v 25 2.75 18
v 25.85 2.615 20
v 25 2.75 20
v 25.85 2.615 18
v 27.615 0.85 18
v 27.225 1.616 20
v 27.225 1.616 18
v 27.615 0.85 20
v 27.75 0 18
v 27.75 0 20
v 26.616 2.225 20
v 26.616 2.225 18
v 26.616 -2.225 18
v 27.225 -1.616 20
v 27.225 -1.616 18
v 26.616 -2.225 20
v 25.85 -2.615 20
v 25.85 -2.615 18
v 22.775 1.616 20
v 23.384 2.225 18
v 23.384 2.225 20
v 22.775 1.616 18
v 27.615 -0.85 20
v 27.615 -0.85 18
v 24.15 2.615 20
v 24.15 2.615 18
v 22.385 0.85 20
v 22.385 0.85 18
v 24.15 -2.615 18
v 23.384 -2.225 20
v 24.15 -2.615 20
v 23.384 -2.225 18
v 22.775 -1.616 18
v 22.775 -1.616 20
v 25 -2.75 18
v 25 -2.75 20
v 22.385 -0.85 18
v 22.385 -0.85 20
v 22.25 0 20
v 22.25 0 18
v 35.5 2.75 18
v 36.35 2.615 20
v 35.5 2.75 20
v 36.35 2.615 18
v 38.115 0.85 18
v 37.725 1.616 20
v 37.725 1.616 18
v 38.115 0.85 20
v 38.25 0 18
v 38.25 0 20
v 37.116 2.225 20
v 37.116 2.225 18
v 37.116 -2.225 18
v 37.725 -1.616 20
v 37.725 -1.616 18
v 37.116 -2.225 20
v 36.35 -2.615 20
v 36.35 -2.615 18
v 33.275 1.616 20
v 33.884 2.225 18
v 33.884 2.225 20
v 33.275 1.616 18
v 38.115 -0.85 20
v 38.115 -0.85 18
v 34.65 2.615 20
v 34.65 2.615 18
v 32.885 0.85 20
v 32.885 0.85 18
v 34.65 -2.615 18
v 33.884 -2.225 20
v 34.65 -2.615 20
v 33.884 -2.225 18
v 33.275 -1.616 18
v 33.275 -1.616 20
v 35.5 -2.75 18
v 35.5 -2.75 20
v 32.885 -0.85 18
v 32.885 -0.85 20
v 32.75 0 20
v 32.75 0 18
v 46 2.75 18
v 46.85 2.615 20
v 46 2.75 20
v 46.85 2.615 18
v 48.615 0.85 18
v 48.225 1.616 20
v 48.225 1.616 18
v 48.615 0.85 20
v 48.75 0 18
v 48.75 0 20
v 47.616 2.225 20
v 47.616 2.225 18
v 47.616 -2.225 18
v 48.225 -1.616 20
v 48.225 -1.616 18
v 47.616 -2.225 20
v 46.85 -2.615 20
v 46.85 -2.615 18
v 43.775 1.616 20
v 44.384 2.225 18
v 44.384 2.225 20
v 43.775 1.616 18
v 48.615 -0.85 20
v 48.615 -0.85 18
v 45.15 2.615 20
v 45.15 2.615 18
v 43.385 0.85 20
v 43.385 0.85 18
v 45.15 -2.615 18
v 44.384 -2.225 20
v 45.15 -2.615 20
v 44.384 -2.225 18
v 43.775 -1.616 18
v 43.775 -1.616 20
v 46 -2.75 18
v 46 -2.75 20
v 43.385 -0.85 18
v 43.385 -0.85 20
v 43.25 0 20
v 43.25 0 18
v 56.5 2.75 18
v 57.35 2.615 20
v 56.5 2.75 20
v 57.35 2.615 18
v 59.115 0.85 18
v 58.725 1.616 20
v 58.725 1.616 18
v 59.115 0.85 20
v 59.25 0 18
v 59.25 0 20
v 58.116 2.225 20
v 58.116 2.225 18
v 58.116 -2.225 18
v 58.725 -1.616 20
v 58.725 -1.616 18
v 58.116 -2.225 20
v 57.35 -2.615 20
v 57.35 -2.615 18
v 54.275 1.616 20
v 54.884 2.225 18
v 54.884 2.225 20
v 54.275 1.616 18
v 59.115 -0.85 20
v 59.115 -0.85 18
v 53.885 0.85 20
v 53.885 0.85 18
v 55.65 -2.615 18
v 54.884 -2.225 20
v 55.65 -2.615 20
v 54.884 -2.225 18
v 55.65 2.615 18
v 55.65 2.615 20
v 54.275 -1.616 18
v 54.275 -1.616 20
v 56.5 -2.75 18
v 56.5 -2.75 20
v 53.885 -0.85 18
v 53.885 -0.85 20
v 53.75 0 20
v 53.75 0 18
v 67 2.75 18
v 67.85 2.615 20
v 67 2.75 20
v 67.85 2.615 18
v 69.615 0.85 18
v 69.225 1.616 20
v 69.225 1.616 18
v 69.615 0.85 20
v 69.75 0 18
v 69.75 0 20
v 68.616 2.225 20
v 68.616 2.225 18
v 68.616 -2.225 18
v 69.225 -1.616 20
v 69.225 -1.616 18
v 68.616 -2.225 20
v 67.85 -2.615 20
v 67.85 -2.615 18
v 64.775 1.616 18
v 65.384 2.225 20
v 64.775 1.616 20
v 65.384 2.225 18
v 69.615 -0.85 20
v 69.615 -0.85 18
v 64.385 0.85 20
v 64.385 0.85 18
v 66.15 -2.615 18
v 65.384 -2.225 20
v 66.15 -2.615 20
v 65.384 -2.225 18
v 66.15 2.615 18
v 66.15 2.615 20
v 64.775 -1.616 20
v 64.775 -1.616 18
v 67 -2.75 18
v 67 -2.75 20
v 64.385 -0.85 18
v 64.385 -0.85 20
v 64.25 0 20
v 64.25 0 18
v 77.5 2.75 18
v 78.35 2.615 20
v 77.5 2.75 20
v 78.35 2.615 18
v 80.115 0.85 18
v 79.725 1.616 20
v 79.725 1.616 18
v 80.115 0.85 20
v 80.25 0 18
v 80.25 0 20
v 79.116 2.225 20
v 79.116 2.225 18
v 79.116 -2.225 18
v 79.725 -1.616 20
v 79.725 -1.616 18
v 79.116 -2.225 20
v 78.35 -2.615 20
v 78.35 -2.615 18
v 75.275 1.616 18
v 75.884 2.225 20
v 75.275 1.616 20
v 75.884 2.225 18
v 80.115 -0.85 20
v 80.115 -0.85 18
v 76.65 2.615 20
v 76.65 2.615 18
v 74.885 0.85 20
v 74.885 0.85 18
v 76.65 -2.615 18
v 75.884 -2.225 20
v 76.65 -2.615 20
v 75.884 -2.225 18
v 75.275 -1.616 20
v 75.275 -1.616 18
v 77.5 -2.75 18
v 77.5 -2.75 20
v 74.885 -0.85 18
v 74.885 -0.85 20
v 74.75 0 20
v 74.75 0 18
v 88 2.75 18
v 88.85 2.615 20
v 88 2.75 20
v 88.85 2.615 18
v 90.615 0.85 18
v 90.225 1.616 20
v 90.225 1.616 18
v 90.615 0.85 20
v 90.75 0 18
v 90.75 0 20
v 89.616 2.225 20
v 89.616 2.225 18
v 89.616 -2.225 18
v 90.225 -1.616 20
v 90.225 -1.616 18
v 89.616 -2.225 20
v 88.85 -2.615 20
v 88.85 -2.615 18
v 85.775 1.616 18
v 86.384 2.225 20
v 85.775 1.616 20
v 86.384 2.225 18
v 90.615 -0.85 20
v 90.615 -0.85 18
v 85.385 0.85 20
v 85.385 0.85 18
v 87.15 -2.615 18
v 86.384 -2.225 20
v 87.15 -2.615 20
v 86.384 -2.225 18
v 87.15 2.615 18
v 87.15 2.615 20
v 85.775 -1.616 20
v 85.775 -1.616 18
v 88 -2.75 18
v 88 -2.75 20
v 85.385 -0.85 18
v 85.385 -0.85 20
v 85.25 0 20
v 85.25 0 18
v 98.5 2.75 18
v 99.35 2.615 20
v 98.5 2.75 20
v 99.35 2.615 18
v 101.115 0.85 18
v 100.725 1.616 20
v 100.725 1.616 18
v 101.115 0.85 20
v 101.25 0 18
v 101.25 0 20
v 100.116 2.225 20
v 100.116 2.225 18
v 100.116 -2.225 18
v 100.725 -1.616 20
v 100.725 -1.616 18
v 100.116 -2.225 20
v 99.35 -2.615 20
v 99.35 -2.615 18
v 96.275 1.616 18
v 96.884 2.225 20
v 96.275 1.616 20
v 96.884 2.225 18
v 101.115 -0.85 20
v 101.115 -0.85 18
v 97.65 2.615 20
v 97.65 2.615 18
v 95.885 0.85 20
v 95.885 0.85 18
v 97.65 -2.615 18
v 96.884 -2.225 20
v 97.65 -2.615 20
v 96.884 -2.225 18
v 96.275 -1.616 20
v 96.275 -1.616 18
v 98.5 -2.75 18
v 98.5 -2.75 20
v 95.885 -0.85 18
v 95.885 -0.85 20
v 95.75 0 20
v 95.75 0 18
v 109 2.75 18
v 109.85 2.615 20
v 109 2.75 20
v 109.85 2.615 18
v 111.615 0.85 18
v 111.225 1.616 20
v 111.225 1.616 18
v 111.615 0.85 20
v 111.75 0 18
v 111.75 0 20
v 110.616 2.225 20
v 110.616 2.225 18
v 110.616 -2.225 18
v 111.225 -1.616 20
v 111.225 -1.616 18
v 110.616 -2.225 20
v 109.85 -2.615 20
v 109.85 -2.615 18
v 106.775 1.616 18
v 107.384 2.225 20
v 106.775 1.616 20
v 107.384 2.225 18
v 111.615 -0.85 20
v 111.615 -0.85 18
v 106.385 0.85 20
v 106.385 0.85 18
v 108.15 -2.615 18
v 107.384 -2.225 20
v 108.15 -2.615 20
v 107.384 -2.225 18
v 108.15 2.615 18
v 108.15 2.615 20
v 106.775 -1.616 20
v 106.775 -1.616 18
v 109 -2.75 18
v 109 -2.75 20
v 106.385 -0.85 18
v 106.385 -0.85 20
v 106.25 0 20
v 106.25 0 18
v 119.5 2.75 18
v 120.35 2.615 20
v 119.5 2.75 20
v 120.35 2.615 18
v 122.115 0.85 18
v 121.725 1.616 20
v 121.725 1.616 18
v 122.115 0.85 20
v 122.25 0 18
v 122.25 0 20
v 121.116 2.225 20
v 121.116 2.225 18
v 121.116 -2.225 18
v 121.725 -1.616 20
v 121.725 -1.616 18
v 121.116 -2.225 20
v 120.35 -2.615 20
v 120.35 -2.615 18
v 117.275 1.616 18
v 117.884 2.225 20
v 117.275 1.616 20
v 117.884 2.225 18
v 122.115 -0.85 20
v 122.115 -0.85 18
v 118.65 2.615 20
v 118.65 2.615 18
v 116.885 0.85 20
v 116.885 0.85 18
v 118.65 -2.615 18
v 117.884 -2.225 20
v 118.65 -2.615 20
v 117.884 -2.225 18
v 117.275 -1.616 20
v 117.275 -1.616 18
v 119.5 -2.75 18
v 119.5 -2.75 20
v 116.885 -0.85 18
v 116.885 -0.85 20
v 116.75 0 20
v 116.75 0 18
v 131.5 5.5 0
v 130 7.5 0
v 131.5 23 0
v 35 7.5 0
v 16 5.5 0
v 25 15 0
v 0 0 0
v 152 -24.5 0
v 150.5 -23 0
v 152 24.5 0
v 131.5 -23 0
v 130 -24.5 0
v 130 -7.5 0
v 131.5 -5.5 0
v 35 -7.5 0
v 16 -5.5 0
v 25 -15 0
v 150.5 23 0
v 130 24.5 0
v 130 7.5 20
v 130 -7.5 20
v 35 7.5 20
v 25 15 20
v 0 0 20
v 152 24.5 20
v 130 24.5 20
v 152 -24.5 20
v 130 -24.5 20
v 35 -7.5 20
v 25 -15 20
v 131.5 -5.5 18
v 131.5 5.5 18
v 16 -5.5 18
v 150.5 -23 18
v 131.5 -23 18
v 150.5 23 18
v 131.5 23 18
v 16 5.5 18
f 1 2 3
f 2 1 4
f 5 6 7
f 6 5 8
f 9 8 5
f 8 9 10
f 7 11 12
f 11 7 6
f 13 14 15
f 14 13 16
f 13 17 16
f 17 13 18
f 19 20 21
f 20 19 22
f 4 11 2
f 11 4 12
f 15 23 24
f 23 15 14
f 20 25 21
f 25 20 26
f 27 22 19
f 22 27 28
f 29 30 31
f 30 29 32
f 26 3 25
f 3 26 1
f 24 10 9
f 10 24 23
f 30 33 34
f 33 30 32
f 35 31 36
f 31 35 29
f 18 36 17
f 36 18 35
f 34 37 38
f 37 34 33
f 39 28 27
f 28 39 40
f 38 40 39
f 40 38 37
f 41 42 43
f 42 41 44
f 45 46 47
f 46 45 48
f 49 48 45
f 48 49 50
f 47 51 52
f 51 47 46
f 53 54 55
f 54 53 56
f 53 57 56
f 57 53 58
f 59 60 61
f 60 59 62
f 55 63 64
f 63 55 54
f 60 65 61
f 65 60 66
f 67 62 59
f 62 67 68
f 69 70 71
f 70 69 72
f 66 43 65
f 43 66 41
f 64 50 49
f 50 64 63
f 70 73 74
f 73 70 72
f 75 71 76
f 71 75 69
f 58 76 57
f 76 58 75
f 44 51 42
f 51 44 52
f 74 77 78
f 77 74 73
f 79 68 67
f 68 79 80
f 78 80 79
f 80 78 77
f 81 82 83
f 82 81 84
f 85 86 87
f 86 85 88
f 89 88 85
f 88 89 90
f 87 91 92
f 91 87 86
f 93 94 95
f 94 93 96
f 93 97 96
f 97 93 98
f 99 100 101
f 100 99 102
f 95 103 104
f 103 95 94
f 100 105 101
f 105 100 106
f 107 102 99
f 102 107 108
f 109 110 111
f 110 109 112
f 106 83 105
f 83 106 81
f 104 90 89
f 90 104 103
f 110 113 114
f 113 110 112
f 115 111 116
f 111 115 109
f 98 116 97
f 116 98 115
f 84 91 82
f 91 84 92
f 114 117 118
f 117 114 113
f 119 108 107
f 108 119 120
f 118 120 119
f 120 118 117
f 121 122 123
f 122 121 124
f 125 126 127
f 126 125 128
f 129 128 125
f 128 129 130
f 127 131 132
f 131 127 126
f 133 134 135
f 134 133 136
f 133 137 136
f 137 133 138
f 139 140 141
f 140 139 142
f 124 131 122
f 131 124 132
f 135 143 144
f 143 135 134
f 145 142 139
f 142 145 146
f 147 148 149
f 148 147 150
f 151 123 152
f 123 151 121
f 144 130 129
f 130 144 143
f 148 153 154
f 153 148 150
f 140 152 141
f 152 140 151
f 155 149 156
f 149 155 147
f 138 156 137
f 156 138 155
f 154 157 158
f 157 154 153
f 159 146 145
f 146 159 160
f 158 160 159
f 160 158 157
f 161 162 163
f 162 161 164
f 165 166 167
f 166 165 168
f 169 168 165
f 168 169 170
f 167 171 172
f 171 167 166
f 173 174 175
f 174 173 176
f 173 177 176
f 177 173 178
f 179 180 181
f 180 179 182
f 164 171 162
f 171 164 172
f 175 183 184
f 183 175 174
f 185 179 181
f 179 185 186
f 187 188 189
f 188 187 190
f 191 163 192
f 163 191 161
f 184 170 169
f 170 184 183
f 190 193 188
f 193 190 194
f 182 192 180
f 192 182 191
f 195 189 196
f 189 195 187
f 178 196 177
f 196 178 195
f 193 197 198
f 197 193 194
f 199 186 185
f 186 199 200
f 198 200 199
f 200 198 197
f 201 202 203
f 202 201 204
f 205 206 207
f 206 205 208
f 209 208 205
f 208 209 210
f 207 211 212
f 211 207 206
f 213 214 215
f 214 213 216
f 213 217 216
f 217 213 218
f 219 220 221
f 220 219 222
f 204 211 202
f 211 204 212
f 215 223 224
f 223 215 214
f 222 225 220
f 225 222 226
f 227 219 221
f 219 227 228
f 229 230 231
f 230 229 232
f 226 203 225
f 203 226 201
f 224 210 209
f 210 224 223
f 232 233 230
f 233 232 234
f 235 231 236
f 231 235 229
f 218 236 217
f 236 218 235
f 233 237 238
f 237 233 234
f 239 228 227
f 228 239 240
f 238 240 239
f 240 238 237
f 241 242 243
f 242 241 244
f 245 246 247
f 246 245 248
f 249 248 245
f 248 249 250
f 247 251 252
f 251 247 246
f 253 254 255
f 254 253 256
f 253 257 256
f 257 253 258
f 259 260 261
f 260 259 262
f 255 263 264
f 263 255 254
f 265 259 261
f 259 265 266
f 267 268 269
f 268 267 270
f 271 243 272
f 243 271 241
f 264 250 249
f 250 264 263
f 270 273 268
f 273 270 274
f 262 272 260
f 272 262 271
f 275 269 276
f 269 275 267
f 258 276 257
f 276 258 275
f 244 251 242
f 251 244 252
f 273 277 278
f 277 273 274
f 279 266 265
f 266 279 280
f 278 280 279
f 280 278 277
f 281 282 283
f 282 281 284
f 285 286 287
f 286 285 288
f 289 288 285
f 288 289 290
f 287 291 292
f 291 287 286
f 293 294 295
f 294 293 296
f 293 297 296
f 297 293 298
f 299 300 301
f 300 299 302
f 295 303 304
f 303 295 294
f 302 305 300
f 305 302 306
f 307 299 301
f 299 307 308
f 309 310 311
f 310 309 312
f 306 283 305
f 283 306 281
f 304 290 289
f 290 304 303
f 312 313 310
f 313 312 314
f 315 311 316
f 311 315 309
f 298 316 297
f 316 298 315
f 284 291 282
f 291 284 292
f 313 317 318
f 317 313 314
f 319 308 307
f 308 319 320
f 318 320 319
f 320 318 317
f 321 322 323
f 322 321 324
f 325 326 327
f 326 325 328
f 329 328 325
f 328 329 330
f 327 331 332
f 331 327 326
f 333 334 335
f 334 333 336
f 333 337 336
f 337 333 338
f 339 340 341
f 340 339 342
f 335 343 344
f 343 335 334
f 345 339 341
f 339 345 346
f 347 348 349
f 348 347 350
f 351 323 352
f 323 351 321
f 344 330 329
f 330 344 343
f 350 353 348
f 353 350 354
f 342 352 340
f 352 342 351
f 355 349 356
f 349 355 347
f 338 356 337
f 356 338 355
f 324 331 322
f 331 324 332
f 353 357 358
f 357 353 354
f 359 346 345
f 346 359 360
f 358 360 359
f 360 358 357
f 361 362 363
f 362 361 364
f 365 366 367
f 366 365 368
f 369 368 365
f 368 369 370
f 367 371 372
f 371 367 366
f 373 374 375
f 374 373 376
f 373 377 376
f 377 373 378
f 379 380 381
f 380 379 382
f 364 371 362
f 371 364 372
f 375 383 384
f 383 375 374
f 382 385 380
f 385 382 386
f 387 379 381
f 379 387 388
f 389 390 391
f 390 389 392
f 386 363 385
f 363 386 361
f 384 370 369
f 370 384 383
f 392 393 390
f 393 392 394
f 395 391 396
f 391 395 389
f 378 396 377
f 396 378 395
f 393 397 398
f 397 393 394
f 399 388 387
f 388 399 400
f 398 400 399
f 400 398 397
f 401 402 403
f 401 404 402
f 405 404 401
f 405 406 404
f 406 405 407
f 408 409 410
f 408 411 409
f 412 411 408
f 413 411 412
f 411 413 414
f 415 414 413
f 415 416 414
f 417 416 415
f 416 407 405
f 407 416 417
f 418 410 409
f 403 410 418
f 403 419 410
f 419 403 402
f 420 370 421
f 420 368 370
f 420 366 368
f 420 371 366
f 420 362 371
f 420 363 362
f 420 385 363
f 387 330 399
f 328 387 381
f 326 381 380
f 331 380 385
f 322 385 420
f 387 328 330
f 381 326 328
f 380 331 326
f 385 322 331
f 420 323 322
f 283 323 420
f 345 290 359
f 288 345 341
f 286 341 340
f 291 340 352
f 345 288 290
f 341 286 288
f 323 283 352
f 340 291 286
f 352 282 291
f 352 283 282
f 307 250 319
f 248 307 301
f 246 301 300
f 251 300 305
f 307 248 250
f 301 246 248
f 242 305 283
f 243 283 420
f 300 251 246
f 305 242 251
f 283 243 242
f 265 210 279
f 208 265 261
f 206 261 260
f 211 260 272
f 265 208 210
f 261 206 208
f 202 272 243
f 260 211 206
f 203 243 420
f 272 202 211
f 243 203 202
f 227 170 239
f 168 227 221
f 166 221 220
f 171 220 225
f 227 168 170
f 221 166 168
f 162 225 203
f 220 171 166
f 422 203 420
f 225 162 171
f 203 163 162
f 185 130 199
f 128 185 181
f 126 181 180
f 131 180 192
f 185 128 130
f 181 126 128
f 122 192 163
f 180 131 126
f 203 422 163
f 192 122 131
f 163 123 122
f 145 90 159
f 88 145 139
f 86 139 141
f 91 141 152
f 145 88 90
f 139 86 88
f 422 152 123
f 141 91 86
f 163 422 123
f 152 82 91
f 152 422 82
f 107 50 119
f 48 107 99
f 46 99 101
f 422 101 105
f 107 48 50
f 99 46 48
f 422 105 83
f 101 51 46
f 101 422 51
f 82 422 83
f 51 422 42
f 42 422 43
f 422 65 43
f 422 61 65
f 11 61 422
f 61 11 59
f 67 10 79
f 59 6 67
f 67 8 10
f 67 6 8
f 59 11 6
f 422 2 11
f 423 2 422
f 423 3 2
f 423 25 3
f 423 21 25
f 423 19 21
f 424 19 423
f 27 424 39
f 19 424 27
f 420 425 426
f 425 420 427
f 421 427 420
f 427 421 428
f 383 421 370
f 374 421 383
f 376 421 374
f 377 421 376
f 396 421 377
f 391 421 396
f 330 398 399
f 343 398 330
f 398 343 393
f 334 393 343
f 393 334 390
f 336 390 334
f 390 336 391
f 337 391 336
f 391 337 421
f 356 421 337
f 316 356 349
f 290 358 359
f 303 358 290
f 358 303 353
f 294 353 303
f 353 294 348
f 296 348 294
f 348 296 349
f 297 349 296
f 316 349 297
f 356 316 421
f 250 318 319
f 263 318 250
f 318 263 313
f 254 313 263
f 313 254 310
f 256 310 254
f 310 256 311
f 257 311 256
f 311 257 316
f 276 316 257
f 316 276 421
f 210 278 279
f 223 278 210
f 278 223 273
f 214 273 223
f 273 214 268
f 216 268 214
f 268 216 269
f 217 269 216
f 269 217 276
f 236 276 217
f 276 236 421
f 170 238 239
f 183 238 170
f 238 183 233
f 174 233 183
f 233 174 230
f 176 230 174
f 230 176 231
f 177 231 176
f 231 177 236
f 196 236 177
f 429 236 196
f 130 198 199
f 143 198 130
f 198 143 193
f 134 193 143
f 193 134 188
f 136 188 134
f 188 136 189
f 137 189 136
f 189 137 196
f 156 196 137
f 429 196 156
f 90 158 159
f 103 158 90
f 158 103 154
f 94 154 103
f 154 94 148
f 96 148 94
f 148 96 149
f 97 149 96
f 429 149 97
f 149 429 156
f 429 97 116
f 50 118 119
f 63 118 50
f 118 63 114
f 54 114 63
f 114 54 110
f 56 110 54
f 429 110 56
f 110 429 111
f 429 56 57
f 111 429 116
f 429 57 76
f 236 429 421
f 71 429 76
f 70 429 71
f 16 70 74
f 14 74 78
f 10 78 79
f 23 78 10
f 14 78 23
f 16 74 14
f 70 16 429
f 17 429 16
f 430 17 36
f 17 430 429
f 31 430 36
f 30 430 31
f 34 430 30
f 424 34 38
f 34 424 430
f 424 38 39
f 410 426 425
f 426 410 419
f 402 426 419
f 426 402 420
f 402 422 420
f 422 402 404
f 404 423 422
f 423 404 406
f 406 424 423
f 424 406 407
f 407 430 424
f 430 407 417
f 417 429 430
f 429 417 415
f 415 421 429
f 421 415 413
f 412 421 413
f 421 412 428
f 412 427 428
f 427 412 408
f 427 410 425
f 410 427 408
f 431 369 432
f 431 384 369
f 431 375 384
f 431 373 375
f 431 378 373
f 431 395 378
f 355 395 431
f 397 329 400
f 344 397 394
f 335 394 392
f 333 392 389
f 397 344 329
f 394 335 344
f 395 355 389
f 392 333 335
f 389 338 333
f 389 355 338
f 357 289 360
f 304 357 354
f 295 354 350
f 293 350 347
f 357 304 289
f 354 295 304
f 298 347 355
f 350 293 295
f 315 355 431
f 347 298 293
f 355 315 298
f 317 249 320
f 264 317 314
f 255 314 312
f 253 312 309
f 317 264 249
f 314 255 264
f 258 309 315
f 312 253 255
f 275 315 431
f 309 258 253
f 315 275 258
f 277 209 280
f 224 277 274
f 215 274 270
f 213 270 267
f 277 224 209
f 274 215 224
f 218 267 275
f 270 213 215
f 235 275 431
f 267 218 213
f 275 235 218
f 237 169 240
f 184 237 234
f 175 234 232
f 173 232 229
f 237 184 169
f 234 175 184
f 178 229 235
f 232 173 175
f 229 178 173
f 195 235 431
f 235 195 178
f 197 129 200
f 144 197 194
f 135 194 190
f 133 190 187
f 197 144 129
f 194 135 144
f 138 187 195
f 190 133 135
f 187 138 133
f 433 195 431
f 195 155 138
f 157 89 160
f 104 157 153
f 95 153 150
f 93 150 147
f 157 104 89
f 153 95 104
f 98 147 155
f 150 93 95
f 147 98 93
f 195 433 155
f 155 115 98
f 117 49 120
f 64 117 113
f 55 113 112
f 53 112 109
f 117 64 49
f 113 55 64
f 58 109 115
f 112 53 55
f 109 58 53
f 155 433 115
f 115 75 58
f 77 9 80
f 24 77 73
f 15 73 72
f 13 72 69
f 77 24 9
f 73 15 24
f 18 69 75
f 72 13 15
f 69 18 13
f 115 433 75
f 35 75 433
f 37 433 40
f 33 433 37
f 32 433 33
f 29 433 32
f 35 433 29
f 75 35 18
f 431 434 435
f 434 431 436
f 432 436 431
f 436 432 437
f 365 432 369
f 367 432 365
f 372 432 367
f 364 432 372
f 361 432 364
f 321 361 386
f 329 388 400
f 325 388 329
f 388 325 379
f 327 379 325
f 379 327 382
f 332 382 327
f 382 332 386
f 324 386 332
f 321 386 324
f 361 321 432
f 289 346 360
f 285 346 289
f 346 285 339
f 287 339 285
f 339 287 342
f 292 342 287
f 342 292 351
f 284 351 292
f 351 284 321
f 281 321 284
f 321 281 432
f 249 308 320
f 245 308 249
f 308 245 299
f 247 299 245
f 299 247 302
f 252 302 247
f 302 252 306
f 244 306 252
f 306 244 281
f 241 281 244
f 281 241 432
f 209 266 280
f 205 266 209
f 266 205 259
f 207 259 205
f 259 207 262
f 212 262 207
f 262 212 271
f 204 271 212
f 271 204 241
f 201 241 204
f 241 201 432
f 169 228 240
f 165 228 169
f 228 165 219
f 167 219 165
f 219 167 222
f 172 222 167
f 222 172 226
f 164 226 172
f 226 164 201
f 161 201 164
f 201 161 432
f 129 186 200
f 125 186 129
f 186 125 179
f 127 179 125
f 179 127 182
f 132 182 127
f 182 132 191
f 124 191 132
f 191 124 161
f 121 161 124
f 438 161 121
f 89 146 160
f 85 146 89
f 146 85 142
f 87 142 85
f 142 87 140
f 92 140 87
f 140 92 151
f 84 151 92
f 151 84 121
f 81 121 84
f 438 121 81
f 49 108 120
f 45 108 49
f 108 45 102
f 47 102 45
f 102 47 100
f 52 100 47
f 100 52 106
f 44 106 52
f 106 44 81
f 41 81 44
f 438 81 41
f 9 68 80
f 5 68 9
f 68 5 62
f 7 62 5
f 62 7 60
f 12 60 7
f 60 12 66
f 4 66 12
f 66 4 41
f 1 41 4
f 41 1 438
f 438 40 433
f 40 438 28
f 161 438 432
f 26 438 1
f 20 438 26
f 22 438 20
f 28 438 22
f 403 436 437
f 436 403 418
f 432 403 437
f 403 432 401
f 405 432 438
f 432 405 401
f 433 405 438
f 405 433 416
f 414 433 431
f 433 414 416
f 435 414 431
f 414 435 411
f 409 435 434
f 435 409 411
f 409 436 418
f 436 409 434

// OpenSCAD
$fn = 20;

difference()
{
linear_extrude(height = 20){
    polygon(points = [ [0,0],[25,-15] ,[45,0], [25,15] ], paths=[[0,1,2,3]]);

    //color("red")
        translate([25,-7.5,0])
            square([120,15]);
    //color("red")
        translate([130,-24.5,0])
            square([22,49]);
}
translate([0,0,-2])
{
    linear_extrude(height = 20)
    {
        color("red")
            translate([131.5,-23,-2])
                square([19,46]);
        color("red")
            translate([16,-5.5,-2])
                square([119,11]);
    }
}
for(a = [25: 10.5 : 125])
{
    //color("red")
        translate([a , 0, 10])
            cylinder(d = 5.5, h=25, center = true);
}
}
